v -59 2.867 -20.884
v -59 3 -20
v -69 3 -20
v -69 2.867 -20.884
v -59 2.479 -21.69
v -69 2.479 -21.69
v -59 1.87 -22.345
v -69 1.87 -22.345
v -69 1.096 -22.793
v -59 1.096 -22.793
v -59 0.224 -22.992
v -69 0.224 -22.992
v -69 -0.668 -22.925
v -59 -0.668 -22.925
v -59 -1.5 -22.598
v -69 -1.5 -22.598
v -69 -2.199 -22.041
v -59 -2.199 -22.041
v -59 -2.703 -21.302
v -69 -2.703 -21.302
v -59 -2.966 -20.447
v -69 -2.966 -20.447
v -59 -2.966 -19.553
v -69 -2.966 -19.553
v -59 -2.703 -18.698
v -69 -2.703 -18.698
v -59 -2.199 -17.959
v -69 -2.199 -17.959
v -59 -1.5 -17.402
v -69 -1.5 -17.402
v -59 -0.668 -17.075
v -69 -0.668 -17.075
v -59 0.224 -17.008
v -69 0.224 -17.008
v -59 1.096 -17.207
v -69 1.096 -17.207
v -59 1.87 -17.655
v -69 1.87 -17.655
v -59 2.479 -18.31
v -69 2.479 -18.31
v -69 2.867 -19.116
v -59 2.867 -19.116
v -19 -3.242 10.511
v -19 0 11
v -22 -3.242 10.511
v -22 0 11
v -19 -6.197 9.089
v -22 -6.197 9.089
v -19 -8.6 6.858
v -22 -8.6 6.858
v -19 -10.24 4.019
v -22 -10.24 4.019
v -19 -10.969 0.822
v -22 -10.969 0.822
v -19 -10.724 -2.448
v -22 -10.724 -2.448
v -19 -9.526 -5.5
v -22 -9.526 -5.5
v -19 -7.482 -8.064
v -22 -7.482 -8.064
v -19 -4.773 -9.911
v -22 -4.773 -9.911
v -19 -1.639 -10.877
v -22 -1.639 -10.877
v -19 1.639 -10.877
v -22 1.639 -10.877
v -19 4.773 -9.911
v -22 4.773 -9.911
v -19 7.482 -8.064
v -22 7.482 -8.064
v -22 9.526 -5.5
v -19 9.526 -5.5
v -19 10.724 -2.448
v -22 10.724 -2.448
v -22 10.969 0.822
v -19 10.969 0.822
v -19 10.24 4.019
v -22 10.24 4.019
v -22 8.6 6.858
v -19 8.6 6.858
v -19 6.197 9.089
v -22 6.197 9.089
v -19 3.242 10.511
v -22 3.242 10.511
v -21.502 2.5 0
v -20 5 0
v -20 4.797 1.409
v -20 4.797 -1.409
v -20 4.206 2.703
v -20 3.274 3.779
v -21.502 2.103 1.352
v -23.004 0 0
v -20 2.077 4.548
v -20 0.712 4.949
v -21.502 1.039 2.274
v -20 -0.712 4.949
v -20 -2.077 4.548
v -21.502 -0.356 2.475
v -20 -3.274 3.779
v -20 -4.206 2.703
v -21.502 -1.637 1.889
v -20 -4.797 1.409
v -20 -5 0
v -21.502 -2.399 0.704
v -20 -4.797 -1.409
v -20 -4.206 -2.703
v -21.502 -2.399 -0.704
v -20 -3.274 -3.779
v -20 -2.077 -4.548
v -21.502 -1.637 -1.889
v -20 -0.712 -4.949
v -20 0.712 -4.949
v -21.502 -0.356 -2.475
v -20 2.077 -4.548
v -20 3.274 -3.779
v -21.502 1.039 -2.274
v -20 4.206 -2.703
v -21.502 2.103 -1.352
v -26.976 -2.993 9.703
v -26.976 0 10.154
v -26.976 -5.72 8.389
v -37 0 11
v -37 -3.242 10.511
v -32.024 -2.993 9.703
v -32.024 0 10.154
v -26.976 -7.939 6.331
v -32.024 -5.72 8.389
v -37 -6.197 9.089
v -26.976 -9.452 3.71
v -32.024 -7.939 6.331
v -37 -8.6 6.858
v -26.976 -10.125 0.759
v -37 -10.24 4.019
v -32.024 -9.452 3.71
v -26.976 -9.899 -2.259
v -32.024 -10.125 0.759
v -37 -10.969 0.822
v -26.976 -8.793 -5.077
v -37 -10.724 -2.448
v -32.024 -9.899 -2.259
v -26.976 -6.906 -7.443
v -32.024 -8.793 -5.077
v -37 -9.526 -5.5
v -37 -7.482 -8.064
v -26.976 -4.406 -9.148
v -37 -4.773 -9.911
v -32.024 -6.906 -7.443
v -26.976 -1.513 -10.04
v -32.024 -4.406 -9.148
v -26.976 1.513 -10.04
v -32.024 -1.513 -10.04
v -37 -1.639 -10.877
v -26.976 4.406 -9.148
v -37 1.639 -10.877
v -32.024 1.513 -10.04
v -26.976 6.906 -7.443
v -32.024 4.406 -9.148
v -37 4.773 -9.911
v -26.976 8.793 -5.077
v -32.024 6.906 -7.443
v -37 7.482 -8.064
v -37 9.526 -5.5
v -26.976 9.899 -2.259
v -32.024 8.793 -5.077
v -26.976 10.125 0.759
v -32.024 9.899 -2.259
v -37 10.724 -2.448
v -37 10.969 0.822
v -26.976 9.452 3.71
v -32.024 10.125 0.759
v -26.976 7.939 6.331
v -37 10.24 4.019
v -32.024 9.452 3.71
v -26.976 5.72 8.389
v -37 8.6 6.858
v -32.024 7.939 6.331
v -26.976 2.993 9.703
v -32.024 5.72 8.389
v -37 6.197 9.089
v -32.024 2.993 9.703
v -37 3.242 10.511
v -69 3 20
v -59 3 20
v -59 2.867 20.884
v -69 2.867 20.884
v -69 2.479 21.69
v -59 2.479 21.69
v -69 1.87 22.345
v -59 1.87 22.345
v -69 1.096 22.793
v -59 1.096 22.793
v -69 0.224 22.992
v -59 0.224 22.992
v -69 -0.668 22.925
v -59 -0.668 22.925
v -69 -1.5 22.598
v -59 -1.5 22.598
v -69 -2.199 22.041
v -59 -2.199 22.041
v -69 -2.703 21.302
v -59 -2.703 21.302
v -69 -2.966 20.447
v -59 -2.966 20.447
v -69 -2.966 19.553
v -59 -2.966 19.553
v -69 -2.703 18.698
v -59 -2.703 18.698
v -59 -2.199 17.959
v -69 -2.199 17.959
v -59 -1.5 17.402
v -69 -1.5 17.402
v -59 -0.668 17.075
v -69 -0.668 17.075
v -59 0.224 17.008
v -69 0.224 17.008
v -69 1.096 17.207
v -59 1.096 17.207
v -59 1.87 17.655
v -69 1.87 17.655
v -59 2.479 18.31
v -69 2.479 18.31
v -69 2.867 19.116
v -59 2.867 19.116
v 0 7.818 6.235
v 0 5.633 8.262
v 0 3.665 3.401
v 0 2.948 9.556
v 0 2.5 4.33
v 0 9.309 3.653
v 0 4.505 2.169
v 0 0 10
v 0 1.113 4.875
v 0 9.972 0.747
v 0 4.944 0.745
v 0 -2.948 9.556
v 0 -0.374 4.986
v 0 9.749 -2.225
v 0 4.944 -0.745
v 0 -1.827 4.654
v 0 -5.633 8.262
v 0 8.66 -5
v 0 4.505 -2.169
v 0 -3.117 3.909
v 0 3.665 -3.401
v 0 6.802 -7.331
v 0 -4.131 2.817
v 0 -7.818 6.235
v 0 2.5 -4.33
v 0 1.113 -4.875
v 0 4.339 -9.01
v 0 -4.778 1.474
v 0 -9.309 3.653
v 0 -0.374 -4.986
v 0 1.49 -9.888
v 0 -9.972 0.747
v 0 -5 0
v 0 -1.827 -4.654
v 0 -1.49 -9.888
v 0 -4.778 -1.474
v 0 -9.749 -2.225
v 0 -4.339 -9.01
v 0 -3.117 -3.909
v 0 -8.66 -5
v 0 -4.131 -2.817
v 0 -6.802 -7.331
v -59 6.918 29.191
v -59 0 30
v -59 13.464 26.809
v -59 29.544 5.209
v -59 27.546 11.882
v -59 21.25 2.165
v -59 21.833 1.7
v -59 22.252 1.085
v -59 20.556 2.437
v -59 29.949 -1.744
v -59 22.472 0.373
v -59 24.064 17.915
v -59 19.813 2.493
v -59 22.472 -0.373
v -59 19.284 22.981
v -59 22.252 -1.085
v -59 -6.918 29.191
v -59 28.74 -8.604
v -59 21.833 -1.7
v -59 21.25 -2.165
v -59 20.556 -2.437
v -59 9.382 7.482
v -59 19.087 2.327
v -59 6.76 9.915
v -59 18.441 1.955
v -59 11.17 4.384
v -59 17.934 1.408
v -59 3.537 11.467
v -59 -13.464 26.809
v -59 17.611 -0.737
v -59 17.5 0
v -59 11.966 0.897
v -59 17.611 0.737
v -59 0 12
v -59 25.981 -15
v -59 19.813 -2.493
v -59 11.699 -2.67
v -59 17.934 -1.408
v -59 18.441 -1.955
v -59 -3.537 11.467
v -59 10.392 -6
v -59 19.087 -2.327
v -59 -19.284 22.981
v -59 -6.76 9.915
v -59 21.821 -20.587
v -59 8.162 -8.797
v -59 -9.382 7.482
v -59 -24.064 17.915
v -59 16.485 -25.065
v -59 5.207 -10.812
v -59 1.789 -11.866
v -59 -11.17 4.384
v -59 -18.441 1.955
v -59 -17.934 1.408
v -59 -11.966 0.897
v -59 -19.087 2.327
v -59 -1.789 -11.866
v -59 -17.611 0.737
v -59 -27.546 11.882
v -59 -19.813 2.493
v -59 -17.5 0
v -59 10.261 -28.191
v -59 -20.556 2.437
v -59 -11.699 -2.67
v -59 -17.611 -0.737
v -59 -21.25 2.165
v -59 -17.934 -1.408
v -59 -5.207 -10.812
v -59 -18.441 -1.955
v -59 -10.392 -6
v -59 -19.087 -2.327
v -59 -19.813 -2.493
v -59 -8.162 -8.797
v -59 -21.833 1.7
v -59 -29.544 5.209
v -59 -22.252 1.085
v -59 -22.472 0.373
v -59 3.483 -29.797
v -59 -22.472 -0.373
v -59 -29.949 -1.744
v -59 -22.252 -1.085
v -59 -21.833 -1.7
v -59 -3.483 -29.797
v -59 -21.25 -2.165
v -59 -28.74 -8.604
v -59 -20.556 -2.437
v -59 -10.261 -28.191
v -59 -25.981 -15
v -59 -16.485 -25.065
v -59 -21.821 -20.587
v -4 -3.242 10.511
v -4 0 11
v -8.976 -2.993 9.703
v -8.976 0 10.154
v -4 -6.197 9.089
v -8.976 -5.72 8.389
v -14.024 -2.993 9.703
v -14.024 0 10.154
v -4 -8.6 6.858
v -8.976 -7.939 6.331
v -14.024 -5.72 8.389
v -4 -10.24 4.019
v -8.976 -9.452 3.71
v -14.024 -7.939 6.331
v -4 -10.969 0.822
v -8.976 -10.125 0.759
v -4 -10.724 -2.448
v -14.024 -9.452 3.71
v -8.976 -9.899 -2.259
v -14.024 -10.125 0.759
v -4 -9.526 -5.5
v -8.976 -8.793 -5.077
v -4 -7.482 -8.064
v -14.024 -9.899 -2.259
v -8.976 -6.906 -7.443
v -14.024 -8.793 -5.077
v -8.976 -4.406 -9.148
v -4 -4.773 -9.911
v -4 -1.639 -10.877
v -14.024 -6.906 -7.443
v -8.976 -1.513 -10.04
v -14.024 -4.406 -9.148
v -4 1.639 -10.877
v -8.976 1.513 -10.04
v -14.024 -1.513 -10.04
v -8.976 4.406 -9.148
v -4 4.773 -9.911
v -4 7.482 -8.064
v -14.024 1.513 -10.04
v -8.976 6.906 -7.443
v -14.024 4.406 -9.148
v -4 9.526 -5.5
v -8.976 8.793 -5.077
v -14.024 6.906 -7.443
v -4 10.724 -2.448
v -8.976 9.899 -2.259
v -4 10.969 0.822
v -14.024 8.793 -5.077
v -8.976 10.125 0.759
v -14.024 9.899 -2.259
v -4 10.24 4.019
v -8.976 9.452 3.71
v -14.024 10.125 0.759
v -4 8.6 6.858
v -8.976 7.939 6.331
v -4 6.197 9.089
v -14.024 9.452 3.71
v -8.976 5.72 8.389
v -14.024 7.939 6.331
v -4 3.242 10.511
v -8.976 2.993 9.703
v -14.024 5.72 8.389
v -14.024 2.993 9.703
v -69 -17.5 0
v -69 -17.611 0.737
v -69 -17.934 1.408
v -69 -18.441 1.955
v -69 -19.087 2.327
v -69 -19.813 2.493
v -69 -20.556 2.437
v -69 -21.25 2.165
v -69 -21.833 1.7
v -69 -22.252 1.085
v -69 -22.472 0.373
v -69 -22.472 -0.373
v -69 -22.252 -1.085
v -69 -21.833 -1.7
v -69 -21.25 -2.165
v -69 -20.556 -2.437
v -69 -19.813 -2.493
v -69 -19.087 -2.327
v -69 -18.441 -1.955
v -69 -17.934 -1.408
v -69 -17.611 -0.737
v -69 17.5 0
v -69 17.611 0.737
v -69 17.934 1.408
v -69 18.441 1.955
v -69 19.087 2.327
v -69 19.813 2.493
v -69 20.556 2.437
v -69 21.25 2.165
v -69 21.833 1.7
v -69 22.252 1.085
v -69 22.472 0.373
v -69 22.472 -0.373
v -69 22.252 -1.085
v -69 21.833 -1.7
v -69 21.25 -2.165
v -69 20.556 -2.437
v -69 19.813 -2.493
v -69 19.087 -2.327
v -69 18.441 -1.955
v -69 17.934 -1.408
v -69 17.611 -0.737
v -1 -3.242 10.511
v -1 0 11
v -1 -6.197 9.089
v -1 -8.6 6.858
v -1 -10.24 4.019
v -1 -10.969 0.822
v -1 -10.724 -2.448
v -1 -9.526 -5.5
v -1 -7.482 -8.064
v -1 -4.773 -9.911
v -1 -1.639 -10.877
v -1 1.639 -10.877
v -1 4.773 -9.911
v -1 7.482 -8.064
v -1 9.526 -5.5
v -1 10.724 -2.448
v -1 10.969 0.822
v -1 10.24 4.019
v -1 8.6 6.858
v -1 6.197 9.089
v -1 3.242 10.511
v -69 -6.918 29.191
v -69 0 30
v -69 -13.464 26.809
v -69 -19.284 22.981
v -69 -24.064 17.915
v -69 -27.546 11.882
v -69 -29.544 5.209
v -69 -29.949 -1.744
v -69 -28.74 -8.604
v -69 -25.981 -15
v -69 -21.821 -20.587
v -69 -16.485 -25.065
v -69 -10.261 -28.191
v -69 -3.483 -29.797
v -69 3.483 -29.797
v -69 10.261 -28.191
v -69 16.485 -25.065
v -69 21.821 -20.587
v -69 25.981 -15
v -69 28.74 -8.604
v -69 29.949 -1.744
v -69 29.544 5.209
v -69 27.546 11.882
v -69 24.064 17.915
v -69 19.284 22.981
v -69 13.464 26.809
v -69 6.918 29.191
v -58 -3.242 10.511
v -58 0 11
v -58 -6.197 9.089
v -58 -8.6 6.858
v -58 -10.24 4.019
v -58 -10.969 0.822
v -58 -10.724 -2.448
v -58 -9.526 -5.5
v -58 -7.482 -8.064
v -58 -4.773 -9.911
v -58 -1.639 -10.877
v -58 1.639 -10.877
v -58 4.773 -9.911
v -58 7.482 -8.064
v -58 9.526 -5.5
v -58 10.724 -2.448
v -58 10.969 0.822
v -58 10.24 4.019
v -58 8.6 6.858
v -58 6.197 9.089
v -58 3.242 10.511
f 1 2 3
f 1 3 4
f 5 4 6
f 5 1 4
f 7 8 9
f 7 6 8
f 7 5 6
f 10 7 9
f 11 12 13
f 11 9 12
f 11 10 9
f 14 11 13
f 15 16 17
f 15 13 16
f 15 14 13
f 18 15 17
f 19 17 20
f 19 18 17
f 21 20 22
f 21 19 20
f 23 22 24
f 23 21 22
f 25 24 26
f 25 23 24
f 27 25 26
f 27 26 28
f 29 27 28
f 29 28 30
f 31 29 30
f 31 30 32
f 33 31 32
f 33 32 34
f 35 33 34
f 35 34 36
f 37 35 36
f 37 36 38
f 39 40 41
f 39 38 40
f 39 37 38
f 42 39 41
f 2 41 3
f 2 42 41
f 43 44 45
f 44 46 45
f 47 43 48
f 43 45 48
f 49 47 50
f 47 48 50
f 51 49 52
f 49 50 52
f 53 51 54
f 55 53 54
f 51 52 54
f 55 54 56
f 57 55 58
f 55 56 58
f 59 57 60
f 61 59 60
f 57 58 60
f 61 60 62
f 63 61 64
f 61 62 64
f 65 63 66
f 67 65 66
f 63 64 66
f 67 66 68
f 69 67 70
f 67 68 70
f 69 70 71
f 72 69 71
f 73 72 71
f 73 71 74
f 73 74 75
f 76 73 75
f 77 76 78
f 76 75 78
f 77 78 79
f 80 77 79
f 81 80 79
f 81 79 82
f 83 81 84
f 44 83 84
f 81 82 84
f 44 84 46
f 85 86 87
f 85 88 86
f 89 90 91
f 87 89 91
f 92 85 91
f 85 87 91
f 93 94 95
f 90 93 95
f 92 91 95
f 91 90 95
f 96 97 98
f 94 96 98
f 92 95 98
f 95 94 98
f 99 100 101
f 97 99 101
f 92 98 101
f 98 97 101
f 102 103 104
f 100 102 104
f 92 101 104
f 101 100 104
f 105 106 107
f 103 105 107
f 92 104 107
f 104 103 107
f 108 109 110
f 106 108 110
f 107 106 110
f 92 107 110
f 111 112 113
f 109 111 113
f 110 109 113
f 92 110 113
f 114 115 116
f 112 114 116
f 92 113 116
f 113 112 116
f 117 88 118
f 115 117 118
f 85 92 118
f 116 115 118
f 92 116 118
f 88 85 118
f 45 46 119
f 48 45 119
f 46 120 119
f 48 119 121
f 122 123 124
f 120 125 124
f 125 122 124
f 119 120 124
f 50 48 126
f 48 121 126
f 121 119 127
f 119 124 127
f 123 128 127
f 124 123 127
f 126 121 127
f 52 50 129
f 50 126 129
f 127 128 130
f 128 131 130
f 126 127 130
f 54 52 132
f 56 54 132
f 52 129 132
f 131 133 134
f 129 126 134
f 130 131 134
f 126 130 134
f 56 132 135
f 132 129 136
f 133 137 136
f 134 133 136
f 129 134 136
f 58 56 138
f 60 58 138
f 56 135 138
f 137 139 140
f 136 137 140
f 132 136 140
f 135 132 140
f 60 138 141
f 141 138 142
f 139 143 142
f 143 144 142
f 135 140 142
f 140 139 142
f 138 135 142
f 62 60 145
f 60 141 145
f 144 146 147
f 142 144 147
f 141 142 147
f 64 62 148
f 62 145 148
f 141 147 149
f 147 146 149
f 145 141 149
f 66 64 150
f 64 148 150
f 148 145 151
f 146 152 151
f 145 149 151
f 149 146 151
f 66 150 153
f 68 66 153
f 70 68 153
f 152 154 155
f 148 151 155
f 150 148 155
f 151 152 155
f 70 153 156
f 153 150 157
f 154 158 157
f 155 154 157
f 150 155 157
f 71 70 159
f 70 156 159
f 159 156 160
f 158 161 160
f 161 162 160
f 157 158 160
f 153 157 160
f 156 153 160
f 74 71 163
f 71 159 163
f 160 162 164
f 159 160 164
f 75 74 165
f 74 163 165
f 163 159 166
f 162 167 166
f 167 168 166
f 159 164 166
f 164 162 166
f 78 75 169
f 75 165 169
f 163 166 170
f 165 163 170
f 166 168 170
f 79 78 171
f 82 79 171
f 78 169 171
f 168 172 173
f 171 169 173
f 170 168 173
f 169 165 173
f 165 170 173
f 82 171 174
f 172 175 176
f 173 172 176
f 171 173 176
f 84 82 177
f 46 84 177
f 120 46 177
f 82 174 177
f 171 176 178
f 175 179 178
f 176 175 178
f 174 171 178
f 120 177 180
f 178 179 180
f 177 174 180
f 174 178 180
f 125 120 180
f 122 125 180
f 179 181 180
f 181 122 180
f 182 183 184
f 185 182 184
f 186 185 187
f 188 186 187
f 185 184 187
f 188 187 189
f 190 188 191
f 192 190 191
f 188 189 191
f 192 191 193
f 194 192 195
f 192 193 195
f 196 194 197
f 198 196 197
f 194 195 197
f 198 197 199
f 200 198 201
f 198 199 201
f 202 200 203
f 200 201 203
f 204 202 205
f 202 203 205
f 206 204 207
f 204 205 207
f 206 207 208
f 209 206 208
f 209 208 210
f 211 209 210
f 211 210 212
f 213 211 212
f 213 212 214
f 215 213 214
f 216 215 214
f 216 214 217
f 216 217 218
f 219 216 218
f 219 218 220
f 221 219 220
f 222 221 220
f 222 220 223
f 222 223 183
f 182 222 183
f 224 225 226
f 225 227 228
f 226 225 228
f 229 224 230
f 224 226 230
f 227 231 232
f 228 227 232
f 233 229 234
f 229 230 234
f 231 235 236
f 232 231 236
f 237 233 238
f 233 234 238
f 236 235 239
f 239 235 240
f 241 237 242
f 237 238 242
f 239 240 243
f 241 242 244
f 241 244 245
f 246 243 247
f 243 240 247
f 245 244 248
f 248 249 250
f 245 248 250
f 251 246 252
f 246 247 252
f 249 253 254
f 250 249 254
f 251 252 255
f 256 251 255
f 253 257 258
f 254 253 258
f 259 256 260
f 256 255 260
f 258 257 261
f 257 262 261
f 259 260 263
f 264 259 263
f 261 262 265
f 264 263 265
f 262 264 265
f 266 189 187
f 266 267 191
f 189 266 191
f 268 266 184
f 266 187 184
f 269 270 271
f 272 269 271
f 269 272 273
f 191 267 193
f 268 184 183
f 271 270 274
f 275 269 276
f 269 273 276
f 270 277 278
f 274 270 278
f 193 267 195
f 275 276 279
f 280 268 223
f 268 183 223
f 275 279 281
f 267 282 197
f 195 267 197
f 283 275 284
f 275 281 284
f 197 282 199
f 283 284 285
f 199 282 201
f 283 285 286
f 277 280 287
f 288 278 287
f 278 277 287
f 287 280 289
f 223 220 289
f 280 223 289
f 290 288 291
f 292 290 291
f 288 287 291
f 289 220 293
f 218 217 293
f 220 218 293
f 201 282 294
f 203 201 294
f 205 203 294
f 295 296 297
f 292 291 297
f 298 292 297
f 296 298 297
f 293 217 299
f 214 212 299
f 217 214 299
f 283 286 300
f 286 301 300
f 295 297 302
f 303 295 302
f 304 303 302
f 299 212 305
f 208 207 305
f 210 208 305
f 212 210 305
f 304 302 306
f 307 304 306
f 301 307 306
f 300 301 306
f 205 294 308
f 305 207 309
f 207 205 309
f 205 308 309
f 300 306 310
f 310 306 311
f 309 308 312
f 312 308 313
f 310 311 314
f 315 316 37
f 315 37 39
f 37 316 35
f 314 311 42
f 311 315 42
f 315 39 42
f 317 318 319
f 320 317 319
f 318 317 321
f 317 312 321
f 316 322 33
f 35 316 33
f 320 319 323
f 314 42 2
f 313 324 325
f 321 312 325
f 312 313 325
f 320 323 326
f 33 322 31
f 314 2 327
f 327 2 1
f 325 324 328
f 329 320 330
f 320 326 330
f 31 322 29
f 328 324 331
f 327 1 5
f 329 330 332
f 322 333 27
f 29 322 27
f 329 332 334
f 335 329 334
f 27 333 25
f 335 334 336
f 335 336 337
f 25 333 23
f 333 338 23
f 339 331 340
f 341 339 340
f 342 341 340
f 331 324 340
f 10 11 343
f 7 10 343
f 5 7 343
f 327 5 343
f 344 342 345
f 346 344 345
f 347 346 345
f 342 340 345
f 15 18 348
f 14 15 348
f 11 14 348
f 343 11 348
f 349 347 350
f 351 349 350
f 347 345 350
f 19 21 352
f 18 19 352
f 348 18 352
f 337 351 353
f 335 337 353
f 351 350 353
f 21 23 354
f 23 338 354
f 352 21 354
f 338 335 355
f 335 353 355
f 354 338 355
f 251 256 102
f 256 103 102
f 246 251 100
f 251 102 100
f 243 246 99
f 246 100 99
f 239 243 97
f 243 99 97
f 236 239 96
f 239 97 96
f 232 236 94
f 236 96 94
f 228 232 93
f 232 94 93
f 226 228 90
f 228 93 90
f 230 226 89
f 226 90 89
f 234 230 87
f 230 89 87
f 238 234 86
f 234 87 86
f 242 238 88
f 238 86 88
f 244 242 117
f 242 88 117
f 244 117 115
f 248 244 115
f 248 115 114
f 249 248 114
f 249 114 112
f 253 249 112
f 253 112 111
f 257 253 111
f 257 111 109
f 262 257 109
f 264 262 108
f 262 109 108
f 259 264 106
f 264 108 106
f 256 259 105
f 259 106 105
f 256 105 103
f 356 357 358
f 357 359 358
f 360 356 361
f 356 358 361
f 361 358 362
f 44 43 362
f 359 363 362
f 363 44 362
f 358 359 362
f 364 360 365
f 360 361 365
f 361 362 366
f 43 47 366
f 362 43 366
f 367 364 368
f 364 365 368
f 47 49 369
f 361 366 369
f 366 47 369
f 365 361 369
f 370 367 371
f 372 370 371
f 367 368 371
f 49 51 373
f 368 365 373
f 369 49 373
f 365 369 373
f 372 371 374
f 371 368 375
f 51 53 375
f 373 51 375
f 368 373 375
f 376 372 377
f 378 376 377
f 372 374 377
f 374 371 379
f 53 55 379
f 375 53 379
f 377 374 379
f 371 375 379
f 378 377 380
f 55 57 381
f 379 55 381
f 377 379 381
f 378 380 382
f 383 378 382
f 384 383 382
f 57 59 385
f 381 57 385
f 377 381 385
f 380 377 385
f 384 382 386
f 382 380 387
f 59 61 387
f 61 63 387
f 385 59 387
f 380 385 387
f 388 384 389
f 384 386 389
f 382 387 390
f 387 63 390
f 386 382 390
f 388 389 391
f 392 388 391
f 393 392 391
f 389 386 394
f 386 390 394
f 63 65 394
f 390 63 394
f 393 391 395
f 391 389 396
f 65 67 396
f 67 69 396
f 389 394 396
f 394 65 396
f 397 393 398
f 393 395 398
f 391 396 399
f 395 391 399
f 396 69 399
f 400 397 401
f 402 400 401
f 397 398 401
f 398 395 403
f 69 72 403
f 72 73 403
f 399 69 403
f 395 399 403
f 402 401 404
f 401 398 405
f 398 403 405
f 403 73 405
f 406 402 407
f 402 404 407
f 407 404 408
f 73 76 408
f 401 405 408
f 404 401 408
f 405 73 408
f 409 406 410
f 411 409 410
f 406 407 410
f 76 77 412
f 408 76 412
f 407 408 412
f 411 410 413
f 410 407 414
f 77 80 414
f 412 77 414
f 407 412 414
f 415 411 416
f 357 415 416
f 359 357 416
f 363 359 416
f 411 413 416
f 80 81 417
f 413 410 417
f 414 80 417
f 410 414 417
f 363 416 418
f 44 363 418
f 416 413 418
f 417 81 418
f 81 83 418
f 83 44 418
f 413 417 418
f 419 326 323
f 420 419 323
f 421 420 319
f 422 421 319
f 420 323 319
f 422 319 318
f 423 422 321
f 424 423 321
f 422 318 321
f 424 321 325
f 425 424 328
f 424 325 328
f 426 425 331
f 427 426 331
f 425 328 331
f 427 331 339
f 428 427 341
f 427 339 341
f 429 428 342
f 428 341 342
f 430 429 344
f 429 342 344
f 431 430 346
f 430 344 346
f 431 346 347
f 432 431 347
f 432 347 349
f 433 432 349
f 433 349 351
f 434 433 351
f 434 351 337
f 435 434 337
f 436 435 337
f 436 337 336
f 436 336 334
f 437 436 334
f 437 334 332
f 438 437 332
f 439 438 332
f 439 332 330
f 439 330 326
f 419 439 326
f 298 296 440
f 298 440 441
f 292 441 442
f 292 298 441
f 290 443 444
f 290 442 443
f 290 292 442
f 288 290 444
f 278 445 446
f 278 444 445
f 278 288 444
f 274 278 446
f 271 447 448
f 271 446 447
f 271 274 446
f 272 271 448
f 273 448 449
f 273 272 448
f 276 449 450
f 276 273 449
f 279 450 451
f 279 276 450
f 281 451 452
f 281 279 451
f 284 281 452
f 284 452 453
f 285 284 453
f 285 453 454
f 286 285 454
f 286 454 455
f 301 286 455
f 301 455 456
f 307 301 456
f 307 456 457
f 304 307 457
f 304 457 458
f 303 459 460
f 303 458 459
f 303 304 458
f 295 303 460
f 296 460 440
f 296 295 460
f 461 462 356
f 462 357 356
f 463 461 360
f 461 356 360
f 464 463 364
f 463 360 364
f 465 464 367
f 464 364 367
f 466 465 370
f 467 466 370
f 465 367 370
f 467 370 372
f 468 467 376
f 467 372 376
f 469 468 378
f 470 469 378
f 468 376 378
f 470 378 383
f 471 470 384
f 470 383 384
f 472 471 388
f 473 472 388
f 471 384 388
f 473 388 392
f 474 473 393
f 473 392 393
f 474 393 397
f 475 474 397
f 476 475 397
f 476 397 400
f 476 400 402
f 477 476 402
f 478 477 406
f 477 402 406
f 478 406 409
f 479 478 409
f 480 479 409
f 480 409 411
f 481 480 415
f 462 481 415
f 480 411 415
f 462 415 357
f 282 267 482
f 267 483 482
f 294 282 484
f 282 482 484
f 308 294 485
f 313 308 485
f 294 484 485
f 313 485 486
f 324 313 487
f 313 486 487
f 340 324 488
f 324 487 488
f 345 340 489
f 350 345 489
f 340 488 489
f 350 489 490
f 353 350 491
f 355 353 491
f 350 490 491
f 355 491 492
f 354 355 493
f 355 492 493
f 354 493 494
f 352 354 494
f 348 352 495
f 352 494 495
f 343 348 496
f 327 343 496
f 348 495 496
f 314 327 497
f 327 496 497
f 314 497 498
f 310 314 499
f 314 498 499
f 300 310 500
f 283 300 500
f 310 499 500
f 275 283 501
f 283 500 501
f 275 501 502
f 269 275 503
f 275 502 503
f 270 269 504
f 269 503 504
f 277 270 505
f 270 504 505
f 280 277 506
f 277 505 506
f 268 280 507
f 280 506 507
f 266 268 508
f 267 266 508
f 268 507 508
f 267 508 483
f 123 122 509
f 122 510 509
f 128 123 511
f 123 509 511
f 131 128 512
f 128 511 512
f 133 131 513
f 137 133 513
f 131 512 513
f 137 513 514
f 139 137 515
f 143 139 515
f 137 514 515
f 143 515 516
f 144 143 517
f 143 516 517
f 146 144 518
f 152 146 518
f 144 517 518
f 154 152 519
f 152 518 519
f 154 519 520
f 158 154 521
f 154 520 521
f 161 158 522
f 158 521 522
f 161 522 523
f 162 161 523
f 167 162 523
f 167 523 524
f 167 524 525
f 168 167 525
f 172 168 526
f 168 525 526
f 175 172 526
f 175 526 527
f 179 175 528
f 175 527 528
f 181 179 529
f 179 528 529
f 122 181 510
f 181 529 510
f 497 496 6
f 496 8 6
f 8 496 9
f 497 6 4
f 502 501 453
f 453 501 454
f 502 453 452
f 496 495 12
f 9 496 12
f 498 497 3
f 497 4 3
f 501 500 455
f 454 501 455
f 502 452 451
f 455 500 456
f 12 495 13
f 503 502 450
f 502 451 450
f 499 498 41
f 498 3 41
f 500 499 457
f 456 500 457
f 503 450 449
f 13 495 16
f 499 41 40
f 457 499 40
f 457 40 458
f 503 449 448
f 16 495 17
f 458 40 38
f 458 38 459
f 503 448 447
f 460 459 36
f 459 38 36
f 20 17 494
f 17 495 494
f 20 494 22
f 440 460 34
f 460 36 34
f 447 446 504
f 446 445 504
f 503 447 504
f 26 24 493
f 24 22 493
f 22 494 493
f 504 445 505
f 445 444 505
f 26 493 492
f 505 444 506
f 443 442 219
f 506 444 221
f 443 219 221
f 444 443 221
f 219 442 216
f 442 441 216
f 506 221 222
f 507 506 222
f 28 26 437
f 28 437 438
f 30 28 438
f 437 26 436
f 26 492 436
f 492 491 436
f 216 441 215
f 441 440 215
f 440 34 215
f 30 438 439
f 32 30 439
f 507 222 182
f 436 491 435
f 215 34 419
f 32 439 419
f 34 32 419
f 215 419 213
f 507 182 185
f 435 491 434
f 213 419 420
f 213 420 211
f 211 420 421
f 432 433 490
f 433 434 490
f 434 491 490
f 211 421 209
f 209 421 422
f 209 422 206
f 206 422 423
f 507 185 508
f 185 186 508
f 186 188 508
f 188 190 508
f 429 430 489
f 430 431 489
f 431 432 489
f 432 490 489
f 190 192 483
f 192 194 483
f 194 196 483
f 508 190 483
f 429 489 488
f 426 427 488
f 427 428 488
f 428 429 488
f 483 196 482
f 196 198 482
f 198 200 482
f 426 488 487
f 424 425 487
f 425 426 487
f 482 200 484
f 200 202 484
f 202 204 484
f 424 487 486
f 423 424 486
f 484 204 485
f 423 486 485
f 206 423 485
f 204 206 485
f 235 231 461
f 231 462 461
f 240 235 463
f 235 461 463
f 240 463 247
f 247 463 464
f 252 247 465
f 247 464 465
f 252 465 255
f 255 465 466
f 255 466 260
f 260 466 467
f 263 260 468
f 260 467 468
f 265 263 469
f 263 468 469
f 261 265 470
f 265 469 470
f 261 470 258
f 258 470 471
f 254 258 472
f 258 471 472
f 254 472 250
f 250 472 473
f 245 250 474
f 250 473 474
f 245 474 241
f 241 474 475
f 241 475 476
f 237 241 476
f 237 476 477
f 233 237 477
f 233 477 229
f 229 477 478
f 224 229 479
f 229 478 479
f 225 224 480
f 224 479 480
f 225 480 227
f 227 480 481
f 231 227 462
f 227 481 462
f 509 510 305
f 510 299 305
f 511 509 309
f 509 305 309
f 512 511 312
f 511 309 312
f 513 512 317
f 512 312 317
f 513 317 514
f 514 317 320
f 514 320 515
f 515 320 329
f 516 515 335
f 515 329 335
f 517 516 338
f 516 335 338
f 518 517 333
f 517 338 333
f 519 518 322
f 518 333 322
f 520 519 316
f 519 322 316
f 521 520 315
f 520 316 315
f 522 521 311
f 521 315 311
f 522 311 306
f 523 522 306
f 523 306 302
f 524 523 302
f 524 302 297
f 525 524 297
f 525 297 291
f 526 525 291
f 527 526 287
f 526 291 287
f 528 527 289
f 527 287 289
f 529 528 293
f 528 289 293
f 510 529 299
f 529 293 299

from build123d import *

# Parameters (mm, degrees)
F3_D     = 6
F5_D     = 5
F7_D     = 10
F7_DEPTH = 20
F7_TIP   = 3.0043030951


# Not quite as in the source:
# - a pattern or mirror of a feature is missing from the dataset's text; its kind, count and spacing are read off the source's solid


with BuildPart() as f1:
    # F0 (on Front) → F1 (revolve)
    with BuildSketch(Plane.XZ):
        with BuildLine():
            Line((-58, 11), (-59, 12))
            Line((-59, 12), (-59, 30))
            Line((-59, 30), (-69, 30))
            Line((-69, 30), (-69, 0))
            Line((-69, 0), (0, 0))
            Line((0, 0), (0, 10))
            Line((0, 10), (-1, 11))
            Line((-1, 11), (-4, 11))
            ThreePointArc((-4, 11), (-11.5, 10.0473750966), (-19, 11))
            Line((-19, 11), (-22, 11))
            ThreePointArc((-22, 11), (-29.5, 10.0473750966), (-37, 11))
            Line((-37, 11), (-58, 11))
        make_face()
    revolve(axis=Axis((-18.6788269784, 0, 0), (1, 0, 0)))

    # F3 (through all)
    with Locations(Plane(origin=(-69, 0, 0), x_dir=(0, -1, 0), z_dir=(-1, 0, 0))):
        with Locations((0, 20)):
            f3 = Hole(F3_D / 2)

    # F3_copies: F3 across plane
    add(f3.mirror(Plane(origin=(0, 0, 0), x_dir=(-1, 0, 0), z_dir=(0, 0, -1))), mode=Mode.SUBTRACT)

    # F5 (through all)
    with Locations(Plane(origin=(-69, 0, 0), x_dir=(0, -1, 0), z_dir=(-1, 0, 0))):
        with Locations((20, 0)):
            f5 = Hole(F5_D / 2)

    # F5_copies: F5 across plane
    add(f5.mirror(Plane.ZX), mode=Mode.SUBTRACT)

    # F7
    with Locations(Plane.YZ):
        with Locations((0, 0)):
            Hole(F7_D / 2, depth=F7_DEPTH)
            with Locations((0, 0, -(F7_DEPTH + F7_TIP / 2))):  # 118° drill point
                Cone(0, F7_D / 2, F7_TIP, mode=Mode.SUBTRACT)


solid = f1.part
